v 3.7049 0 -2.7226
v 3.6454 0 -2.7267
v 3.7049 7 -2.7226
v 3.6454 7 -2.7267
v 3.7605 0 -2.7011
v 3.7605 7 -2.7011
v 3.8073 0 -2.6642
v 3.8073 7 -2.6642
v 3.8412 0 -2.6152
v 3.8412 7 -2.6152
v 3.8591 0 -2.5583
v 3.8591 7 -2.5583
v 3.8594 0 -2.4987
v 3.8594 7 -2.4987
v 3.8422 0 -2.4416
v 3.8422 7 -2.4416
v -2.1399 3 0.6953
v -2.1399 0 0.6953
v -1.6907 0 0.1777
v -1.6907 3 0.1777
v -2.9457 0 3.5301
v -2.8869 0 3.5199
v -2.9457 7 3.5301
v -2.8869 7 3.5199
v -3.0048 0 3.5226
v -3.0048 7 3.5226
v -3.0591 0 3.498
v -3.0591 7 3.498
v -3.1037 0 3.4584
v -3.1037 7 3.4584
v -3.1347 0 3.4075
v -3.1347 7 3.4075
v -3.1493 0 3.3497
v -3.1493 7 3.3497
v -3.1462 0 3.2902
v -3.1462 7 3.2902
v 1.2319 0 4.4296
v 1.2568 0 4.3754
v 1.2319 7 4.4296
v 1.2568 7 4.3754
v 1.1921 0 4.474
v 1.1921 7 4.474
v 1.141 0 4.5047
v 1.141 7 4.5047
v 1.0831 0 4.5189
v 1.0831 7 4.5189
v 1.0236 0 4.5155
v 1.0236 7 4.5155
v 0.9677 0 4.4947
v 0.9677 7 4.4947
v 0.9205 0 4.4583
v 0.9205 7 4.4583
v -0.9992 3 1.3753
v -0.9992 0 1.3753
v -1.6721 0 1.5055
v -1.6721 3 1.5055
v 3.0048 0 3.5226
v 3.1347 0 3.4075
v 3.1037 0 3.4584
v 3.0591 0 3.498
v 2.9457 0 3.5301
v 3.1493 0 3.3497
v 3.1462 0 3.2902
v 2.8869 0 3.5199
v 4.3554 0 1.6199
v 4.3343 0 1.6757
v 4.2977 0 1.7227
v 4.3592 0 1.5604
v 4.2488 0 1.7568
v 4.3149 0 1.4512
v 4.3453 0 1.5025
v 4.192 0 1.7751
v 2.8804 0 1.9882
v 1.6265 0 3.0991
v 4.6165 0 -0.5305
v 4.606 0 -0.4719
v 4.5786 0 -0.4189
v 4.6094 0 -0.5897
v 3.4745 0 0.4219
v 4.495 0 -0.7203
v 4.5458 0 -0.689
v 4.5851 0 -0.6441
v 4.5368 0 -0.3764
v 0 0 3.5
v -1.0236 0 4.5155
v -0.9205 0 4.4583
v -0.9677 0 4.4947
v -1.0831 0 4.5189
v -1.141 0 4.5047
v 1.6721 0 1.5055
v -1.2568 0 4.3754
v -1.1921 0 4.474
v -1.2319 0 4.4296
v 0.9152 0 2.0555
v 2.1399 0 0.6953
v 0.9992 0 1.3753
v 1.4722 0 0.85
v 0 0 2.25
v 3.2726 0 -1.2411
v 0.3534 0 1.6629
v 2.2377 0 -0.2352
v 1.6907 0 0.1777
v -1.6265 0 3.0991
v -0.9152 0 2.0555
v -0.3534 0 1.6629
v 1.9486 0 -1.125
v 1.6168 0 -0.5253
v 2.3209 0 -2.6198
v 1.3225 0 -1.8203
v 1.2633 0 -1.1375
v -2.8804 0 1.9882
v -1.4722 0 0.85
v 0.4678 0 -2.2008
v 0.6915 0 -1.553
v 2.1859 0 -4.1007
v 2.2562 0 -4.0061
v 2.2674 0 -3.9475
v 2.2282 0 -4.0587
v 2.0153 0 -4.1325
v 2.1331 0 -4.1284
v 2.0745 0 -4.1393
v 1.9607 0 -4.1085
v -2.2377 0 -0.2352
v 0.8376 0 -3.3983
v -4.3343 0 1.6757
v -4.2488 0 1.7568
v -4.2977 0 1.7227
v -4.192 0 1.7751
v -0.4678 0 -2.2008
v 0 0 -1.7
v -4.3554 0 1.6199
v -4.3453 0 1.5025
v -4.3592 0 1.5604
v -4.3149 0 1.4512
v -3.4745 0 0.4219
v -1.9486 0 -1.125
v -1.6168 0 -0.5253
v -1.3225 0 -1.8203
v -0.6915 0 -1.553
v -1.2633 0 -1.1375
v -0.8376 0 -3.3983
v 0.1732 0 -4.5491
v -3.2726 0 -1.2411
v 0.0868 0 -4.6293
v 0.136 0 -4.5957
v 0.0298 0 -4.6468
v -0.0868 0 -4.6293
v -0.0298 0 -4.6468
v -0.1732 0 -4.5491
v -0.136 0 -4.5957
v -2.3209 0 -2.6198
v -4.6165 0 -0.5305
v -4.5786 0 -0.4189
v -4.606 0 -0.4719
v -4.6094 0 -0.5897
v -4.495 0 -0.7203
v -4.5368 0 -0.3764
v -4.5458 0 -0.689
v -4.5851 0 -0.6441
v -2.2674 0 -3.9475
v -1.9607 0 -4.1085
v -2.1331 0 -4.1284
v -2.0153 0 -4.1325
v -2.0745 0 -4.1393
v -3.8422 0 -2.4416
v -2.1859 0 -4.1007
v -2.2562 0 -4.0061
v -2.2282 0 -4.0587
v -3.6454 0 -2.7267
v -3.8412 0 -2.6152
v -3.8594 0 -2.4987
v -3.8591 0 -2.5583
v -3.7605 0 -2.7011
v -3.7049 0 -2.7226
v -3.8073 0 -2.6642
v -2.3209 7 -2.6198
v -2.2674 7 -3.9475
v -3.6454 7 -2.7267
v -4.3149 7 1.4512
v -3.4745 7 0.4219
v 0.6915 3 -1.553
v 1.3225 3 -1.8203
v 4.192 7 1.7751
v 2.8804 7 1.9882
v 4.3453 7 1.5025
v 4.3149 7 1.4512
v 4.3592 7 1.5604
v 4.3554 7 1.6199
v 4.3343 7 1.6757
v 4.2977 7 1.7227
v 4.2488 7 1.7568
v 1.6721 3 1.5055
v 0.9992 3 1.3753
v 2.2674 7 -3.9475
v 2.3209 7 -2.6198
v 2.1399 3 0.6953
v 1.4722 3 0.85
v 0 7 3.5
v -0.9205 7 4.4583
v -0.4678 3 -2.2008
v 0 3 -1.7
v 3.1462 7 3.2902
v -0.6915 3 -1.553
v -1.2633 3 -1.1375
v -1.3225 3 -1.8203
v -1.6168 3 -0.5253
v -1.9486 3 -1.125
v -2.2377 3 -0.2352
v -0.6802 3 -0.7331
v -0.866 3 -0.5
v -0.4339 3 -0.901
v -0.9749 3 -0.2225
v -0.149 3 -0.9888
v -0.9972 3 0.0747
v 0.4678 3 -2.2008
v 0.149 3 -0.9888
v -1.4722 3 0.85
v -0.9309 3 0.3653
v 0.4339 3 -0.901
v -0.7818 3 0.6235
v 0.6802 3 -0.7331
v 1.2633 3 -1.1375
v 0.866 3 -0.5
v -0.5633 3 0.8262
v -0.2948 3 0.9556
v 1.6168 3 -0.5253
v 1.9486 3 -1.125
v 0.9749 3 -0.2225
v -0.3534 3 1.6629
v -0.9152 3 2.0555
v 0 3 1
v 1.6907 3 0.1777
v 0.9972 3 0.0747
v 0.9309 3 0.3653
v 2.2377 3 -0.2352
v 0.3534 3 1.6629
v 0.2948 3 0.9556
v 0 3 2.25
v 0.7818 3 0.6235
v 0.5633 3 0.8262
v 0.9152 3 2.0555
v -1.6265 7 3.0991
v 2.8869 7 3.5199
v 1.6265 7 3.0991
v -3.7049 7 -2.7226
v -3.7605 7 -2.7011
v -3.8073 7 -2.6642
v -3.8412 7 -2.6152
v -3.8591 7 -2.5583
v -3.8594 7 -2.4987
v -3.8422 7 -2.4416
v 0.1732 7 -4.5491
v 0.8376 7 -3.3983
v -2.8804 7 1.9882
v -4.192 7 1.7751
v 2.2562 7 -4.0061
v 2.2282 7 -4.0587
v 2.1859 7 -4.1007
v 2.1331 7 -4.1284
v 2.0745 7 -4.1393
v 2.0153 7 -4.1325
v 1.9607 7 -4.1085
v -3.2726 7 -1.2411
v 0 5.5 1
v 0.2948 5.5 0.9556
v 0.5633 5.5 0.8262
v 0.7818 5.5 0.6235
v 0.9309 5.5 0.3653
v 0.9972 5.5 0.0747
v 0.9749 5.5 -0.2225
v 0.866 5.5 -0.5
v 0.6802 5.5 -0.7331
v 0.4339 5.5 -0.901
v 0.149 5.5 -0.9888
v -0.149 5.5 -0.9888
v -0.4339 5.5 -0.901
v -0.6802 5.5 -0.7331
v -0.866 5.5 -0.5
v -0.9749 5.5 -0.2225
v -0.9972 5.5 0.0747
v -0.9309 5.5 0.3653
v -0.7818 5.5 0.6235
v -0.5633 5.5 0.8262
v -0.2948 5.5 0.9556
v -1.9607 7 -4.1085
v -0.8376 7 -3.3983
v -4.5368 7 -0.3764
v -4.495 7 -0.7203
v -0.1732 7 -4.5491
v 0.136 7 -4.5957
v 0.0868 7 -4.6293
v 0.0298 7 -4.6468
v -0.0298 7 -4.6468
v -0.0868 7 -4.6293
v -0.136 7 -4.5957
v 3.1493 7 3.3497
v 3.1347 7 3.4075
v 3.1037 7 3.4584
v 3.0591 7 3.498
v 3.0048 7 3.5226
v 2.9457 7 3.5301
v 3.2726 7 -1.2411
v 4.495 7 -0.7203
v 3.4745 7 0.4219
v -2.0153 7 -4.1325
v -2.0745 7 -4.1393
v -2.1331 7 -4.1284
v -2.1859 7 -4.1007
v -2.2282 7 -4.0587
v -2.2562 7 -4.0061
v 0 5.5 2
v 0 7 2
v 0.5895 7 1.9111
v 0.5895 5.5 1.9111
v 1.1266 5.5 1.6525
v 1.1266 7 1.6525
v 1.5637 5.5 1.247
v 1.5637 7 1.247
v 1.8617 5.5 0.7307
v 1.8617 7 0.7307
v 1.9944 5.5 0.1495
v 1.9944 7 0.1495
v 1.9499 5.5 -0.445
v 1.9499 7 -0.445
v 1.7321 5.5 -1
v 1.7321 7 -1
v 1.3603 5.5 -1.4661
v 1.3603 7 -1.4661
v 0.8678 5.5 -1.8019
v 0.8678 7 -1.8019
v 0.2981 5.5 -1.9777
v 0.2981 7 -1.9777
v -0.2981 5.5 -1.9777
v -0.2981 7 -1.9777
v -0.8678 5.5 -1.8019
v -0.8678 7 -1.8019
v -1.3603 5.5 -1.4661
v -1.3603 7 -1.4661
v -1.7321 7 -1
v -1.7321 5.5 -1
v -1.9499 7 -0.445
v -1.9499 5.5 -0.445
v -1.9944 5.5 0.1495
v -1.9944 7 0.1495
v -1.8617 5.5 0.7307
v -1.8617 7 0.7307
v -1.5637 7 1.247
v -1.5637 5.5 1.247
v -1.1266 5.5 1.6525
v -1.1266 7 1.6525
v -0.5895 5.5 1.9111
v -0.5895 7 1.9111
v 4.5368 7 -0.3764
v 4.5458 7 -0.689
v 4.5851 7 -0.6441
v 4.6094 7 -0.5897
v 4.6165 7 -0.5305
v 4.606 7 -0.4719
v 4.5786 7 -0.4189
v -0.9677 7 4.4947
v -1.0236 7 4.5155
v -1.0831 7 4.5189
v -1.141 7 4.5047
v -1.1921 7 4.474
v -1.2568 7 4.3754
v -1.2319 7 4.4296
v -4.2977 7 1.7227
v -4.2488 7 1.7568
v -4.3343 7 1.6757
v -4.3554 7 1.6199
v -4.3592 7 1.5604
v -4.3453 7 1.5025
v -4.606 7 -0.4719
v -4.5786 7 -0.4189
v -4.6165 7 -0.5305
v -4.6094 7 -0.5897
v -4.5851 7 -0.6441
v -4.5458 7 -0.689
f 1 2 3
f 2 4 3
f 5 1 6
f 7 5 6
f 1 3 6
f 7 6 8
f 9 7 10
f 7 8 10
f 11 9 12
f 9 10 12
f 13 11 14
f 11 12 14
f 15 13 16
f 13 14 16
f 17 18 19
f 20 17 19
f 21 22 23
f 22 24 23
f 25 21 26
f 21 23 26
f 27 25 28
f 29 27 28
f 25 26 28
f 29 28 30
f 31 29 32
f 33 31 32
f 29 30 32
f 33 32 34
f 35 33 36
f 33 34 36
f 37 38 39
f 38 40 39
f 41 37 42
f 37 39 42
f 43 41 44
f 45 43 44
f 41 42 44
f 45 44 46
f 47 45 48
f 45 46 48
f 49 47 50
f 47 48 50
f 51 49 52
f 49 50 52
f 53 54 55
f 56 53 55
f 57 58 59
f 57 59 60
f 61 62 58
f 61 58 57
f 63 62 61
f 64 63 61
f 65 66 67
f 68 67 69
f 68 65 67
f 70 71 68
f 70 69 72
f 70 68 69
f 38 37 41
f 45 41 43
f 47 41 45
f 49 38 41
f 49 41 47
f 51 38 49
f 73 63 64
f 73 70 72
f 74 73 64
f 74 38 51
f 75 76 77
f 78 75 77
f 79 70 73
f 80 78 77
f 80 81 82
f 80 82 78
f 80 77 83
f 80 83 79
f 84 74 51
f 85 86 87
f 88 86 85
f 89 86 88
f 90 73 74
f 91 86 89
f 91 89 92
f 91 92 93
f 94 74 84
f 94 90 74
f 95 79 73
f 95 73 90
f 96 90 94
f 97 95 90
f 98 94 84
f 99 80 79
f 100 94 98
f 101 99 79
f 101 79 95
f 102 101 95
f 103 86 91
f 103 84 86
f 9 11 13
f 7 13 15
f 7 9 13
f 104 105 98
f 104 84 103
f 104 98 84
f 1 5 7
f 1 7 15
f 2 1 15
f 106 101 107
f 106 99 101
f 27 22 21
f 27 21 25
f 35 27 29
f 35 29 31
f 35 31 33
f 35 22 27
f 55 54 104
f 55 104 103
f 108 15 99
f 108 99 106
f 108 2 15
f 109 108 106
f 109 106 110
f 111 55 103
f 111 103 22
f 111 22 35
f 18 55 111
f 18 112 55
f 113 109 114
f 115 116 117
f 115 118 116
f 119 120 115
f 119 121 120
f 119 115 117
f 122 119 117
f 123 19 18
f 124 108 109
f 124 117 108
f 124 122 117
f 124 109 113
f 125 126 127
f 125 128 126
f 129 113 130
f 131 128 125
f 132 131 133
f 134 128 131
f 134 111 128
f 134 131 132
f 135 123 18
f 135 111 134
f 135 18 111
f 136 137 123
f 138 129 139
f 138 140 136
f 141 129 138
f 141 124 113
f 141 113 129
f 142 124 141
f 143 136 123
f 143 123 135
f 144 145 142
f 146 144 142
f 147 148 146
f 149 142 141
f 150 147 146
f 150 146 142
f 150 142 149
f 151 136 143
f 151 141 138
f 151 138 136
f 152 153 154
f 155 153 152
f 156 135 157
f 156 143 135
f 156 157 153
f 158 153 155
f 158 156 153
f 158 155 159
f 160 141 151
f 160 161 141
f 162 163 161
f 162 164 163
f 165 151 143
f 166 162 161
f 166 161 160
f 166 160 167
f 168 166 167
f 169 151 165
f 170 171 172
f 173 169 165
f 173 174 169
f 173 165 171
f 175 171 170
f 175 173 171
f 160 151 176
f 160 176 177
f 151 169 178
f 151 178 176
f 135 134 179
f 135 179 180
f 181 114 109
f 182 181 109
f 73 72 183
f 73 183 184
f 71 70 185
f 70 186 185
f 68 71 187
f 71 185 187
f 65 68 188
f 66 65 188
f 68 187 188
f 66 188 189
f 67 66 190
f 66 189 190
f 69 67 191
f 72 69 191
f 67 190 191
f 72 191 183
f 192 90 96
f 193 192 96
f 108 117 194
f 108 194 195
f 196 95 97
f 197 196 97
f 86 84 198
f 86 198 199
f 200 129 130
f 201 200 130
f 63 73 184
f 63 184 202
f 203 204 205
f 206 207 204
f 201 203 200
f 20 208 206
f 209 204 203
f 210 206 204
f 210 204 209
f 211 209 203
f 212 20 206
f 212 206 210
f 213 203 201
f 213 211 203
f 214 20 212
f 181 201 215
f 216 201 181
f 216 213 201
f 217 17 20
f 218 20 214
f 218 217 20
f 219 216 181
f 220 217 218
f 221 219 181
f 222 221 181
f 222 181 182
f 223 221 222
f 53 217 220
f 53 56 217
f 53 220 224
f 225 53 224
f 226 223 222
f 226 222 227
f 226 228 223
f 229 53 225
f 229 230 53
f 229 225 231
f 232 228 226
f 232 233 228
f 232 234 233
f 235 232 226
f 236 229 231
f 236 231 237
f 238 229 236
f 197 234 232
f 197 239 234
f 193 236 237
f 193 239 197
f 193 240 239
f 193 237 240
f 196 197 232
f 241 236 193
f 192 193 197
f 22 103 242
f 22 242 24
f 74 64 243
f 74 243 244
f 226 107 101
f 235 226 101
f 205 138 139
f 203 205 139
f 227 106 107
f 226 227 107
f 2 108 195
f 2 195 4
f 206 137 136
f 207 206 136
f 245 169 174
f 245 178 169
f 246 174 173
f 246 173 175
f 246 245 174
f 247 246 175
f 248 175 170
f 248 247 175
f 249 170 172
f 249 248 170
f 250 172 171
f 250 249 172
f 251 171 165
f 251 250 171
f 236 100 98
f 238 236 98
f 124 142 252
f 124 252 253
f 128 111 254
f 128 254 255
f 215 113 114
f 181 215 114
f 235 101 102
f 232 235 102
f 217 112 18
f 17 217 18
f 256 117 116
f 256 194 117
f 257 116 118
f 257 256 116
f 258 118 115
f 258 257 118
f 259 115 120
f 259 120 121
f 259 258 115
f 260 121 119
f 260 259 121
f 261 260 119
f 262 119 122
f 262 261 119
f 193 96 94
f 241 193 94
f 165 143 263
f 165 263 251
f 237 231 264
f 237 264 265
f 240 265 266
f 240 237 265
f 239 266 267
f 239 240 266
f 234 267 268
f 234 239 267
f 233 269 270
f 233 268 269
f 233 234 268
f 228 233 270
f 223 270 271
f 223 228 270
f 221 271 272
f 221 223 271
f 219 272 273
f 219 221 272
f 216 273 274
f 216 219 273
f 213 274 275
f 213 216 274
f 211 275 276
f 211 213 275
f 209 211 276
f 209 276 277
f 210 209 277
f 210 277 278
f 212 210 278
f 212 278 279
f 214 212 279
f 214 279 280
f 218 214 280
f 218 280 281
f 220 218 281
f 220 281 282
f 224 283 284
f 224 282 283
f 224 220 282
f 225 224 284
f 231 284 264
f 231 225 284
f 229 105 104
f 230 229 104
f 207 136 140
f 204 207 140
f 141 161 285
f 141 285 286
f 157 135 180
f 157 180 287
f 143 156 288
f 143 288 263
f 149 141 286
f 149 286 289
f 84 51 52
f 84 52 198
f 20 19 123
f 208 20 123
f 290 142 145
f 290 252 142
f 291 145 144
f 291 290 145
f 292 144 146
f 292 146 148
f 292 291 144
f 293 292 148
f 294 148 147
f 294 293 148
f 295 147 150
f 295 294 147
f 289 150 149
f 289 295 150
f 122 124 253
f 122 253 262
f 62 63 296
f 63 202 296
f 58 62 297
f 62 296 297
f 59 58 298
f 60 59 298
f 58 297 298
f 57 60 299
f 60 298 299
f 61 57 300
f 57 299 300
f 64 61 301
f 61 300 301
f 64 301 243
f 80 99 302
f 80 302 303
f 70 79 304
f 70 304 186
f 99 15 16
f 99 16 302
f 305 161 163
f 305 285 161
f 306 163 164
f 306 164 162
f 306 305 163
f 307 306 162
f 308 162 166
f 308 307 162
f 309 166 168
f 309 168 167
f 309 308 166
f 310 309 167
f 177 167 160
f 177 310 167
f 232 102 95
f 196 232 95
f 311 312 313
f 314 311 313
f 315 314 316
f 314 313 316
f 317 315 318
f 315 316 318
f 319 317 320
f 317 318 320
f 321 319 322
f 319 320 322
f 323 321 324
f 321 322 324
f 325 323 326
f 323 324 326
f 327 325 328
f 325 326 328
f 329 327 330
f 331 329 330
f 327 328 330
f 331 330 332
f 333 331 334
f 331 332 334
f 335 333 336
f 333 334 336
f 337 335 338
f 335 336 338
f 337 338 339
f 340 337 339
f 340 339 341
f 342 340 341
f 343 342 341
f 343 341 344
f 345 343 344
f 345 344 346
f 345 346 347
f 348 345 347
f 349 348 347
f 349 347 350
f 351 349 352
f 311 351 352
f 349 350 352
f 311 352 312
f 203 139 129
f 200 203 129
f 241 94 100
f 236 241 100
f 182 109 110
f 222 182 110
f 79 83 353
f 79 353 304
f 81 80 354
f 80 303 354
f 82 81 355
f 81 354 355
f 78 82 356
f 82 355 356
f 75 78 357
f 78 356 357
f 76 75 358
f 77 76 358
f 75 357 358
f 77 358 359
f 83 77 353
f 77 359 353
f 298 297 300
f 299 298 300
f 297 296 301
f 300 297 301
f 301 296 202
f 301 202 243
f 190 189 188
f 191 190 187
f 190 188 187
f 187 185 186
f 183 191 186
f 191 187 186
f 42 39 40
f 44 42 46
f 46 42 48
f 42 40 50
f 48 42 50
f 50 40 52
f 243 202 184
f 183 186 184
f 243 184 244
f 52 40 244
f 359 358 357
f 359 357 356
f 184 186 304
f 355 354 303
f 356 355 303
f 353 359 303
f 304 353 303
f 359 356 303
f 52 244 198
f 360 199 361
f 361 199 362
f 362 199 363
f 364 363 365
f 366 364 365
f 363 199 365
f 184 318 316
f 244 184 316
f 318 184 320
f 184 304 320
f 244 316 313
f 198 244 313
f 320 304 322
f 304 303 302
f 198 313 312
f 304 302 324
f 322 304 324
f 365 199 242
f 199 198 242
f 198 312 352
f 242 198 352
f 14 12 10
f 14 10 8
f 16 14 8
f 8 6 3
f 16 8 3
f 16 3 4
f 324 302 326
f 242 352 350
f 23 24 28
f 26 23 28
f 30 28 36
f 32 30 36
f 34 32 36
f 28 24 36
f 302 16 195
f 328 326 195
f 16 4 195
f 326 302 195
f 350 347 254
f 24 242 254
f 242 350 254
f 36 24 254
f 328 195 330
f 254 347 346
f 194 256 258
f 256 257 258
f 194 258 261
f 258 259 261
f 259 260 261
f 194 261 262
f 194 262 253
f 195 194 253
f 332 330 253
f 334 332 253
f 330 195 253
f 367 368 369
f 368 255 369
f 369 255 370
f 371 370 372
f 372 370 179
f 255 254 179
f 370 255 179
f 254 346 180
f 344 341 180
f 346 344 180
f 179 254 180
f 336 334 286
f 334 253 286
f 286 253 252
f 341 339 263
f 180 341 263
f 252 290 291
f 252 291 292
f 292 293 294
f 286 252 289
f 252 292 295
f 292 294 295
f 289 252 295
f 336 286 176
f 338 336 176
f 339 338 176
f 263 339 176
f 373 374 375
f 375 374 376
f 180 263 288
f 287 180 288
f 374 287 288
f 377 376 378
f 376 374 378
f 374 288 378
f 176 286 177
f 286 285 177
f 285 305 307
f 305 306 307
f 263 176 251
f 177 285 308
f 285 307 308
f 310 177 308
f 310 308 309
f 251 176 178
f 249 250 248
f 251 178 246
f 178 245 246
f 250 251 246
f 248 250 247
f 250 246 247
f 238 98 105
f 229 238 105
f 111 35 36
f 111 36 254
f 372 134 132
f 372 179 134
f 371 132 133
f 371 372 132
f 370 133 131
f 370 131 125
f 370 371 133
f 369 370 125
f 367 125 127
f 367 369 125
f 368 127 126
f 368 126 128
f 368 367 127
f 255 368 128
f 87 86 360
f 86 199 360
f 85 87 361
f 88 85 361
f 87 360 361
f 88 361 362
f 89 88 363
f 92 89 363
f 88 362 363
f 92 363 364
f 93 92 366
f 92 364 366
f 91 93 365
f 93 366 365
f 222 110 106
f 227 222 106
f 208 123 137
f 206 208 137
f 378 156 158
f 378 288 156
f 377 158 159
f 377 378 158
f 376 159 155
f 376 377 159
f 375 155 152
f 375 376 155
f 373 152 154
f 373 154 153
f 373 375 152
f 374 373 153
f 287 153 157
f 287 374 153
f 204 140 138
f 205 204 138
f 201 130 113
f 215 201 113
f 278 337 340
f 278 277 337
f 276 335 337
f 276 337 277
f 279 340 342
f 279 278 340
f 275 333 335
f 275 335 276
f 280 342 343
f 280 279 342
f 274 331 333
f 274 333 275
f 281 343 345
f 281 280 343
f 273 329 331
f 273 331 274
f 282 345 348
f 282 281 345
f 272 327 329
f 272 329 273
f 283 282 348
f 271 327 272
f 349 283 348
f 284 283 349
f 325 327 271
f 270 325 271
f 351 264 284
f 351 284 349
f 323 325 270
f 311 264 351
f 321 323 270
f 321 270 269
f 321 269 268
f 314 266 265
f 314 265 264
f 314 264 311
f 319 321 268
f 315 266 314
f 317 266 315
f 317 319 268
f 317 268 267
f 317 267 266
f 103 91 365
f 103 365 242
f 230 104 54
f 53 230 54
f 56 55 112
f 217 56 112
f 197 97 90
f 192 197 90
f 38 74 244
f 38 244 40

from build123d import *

# Parameters (mm, degrees)
SKETCH1_R           = 1
BOSS_EXTRUDE1_DEPTH = 7
CUT_EXTRUDE1_DEPTH  = 3
FILLET1_R           = 0.2
SKETCH3_R           = 2
CUT_EXTRUDE2_DEPTH  = 1.5


with BuildPart() as part:
    # Sketch1 → Boss-Extrude1 (new body)
    with BuildSketch(Plane(origin=(0, 0, 0), x_dir=(1, 0, 0), z_dir=(0, 1, 0))):
        Polygon((2.320929304, 2.619787619), (3.990706765, 2.754585991), (3.272556849, 1.241117105), (4.813715291, 0.584490857), (3.474481059, -0.421878381), (4.533959656, -1.719504088), (2.880443531, -1.988226614), (3.215528503, -3.629581369), (1.626531102, -3.09909609), (1.160458522, -4.708165299), (0, -3.5), (-1.160458522, -4.708165299), (-1.626531102, -3.09909609), (-3.215528503, -3.629581369), (-2.880443531, -1.988226614), (-4.533959656, -1.719504088), (-3.474481059, -0.421878381), (-4.813715291, 0.584490857), (-3.272556849, 1.241117105), (-3.990706765, 2.754585991), (-2.320929304, 2.619787619), (-2.253475412, 4.293638671), (-0.837604825, 3.398296361), (0, 4.849070475), (0.837604825, 3.398296361), (2.253475412, 4.293638671), align=None)
        with Locations(Location((0, 0, 0), (0, 0, 270))):
            Circle(SKETCH1_R, mode=Mode.SUBTRACT)
    extrude(amount=BOSS_EXTRUDE1_DEPTH)

    # Sketch2 → Cut-Extrude1 (cut)
    with BuildSketch(Plane.XZ):
        Polygon((0, 2.25), (-0.353449874, 1.662850921), (-0.915157447, 2.05547728), (-0.999234929, 1.37532889), (-1.672075857, 1.505543864), (-1.472243186, 0.85), (-2.139877162, 0.695288237), (-1.690687222, 0.177698388), (-2.237674265, -0.235189042), (-1.616796078, -0.52532889), (-1.948557159, -1.125), (-1.263346203, -1.137522031), (-1.322516818, -1.820288237), (-0.691452293, -1.553027278), (-0.467801304, -2.200832102), (0, -1.7), (0.467801304, -2.200832102), (0.691452293, -1.553027278), (1.322516818, -1.820288237), (1.263346203, -1.137522031), (1.948557159, -1.125), (1.616796078, -0.52532889), (2.237674265, -0.235189042), (1.690687222, 0.177698388), (2.139877162, 0.695288237), (1.472243186, 0.85), (1.672075857, 1.505543864), (0.999234929, 1.37532889), (0.915157447, 2.05547728), (0.353449874, 1.662850921), align=None)
    extrude(amount=-CUT_EXTRUDE1_DEPTH, mode=Mode.SUBTRACT)

    # Fillet1
    fillet1_edges = [part.edges().sort_by_distance(p)[0] for p in [
        (4.813715291, 3.5, -0.584490857),
        (4.533959656, 3.5, 1.719504088),
        (3.215528503, 3.5, 3.629581369),
        (1.160458522, 3.5, 4.708165299),
        (-1.160458522, 3.5, 4.708165299),
        (-3.215528503, 3.5, 3.629581369),
        (-4.533959656, 3.5, 1.719504088),
        (-4.813715291, 3.5, -0.584490857),
        (-3.990706765, 3.5, -2.754585991),
        (-2.253475412, 3.5, -4.293638671),
        (0, 3.5, -4.849070475),
        (2.253475412, 3.5, -4.293638671),
        (3.990706765, 3.5, -2.754585991),
    ]]
    fillet(fillet1_edges, radius=FILLET1_R)

    # Sketch3 → Cut-Extrude2 (cut)
    with BuildSketch(Plane(origin=(0, 7, 0), x_dir=(1, 0, 0), z_dir=(0, 1, 0))):
        with Locations(Location((0, 0, 0), (0, 0, 270))):
            Circle(SKETCH3_R)
    extrude(amount=-CUT_EXTRUDE2_DEPTH, mode=Mode.SUBTRACT)


solid = part.part
